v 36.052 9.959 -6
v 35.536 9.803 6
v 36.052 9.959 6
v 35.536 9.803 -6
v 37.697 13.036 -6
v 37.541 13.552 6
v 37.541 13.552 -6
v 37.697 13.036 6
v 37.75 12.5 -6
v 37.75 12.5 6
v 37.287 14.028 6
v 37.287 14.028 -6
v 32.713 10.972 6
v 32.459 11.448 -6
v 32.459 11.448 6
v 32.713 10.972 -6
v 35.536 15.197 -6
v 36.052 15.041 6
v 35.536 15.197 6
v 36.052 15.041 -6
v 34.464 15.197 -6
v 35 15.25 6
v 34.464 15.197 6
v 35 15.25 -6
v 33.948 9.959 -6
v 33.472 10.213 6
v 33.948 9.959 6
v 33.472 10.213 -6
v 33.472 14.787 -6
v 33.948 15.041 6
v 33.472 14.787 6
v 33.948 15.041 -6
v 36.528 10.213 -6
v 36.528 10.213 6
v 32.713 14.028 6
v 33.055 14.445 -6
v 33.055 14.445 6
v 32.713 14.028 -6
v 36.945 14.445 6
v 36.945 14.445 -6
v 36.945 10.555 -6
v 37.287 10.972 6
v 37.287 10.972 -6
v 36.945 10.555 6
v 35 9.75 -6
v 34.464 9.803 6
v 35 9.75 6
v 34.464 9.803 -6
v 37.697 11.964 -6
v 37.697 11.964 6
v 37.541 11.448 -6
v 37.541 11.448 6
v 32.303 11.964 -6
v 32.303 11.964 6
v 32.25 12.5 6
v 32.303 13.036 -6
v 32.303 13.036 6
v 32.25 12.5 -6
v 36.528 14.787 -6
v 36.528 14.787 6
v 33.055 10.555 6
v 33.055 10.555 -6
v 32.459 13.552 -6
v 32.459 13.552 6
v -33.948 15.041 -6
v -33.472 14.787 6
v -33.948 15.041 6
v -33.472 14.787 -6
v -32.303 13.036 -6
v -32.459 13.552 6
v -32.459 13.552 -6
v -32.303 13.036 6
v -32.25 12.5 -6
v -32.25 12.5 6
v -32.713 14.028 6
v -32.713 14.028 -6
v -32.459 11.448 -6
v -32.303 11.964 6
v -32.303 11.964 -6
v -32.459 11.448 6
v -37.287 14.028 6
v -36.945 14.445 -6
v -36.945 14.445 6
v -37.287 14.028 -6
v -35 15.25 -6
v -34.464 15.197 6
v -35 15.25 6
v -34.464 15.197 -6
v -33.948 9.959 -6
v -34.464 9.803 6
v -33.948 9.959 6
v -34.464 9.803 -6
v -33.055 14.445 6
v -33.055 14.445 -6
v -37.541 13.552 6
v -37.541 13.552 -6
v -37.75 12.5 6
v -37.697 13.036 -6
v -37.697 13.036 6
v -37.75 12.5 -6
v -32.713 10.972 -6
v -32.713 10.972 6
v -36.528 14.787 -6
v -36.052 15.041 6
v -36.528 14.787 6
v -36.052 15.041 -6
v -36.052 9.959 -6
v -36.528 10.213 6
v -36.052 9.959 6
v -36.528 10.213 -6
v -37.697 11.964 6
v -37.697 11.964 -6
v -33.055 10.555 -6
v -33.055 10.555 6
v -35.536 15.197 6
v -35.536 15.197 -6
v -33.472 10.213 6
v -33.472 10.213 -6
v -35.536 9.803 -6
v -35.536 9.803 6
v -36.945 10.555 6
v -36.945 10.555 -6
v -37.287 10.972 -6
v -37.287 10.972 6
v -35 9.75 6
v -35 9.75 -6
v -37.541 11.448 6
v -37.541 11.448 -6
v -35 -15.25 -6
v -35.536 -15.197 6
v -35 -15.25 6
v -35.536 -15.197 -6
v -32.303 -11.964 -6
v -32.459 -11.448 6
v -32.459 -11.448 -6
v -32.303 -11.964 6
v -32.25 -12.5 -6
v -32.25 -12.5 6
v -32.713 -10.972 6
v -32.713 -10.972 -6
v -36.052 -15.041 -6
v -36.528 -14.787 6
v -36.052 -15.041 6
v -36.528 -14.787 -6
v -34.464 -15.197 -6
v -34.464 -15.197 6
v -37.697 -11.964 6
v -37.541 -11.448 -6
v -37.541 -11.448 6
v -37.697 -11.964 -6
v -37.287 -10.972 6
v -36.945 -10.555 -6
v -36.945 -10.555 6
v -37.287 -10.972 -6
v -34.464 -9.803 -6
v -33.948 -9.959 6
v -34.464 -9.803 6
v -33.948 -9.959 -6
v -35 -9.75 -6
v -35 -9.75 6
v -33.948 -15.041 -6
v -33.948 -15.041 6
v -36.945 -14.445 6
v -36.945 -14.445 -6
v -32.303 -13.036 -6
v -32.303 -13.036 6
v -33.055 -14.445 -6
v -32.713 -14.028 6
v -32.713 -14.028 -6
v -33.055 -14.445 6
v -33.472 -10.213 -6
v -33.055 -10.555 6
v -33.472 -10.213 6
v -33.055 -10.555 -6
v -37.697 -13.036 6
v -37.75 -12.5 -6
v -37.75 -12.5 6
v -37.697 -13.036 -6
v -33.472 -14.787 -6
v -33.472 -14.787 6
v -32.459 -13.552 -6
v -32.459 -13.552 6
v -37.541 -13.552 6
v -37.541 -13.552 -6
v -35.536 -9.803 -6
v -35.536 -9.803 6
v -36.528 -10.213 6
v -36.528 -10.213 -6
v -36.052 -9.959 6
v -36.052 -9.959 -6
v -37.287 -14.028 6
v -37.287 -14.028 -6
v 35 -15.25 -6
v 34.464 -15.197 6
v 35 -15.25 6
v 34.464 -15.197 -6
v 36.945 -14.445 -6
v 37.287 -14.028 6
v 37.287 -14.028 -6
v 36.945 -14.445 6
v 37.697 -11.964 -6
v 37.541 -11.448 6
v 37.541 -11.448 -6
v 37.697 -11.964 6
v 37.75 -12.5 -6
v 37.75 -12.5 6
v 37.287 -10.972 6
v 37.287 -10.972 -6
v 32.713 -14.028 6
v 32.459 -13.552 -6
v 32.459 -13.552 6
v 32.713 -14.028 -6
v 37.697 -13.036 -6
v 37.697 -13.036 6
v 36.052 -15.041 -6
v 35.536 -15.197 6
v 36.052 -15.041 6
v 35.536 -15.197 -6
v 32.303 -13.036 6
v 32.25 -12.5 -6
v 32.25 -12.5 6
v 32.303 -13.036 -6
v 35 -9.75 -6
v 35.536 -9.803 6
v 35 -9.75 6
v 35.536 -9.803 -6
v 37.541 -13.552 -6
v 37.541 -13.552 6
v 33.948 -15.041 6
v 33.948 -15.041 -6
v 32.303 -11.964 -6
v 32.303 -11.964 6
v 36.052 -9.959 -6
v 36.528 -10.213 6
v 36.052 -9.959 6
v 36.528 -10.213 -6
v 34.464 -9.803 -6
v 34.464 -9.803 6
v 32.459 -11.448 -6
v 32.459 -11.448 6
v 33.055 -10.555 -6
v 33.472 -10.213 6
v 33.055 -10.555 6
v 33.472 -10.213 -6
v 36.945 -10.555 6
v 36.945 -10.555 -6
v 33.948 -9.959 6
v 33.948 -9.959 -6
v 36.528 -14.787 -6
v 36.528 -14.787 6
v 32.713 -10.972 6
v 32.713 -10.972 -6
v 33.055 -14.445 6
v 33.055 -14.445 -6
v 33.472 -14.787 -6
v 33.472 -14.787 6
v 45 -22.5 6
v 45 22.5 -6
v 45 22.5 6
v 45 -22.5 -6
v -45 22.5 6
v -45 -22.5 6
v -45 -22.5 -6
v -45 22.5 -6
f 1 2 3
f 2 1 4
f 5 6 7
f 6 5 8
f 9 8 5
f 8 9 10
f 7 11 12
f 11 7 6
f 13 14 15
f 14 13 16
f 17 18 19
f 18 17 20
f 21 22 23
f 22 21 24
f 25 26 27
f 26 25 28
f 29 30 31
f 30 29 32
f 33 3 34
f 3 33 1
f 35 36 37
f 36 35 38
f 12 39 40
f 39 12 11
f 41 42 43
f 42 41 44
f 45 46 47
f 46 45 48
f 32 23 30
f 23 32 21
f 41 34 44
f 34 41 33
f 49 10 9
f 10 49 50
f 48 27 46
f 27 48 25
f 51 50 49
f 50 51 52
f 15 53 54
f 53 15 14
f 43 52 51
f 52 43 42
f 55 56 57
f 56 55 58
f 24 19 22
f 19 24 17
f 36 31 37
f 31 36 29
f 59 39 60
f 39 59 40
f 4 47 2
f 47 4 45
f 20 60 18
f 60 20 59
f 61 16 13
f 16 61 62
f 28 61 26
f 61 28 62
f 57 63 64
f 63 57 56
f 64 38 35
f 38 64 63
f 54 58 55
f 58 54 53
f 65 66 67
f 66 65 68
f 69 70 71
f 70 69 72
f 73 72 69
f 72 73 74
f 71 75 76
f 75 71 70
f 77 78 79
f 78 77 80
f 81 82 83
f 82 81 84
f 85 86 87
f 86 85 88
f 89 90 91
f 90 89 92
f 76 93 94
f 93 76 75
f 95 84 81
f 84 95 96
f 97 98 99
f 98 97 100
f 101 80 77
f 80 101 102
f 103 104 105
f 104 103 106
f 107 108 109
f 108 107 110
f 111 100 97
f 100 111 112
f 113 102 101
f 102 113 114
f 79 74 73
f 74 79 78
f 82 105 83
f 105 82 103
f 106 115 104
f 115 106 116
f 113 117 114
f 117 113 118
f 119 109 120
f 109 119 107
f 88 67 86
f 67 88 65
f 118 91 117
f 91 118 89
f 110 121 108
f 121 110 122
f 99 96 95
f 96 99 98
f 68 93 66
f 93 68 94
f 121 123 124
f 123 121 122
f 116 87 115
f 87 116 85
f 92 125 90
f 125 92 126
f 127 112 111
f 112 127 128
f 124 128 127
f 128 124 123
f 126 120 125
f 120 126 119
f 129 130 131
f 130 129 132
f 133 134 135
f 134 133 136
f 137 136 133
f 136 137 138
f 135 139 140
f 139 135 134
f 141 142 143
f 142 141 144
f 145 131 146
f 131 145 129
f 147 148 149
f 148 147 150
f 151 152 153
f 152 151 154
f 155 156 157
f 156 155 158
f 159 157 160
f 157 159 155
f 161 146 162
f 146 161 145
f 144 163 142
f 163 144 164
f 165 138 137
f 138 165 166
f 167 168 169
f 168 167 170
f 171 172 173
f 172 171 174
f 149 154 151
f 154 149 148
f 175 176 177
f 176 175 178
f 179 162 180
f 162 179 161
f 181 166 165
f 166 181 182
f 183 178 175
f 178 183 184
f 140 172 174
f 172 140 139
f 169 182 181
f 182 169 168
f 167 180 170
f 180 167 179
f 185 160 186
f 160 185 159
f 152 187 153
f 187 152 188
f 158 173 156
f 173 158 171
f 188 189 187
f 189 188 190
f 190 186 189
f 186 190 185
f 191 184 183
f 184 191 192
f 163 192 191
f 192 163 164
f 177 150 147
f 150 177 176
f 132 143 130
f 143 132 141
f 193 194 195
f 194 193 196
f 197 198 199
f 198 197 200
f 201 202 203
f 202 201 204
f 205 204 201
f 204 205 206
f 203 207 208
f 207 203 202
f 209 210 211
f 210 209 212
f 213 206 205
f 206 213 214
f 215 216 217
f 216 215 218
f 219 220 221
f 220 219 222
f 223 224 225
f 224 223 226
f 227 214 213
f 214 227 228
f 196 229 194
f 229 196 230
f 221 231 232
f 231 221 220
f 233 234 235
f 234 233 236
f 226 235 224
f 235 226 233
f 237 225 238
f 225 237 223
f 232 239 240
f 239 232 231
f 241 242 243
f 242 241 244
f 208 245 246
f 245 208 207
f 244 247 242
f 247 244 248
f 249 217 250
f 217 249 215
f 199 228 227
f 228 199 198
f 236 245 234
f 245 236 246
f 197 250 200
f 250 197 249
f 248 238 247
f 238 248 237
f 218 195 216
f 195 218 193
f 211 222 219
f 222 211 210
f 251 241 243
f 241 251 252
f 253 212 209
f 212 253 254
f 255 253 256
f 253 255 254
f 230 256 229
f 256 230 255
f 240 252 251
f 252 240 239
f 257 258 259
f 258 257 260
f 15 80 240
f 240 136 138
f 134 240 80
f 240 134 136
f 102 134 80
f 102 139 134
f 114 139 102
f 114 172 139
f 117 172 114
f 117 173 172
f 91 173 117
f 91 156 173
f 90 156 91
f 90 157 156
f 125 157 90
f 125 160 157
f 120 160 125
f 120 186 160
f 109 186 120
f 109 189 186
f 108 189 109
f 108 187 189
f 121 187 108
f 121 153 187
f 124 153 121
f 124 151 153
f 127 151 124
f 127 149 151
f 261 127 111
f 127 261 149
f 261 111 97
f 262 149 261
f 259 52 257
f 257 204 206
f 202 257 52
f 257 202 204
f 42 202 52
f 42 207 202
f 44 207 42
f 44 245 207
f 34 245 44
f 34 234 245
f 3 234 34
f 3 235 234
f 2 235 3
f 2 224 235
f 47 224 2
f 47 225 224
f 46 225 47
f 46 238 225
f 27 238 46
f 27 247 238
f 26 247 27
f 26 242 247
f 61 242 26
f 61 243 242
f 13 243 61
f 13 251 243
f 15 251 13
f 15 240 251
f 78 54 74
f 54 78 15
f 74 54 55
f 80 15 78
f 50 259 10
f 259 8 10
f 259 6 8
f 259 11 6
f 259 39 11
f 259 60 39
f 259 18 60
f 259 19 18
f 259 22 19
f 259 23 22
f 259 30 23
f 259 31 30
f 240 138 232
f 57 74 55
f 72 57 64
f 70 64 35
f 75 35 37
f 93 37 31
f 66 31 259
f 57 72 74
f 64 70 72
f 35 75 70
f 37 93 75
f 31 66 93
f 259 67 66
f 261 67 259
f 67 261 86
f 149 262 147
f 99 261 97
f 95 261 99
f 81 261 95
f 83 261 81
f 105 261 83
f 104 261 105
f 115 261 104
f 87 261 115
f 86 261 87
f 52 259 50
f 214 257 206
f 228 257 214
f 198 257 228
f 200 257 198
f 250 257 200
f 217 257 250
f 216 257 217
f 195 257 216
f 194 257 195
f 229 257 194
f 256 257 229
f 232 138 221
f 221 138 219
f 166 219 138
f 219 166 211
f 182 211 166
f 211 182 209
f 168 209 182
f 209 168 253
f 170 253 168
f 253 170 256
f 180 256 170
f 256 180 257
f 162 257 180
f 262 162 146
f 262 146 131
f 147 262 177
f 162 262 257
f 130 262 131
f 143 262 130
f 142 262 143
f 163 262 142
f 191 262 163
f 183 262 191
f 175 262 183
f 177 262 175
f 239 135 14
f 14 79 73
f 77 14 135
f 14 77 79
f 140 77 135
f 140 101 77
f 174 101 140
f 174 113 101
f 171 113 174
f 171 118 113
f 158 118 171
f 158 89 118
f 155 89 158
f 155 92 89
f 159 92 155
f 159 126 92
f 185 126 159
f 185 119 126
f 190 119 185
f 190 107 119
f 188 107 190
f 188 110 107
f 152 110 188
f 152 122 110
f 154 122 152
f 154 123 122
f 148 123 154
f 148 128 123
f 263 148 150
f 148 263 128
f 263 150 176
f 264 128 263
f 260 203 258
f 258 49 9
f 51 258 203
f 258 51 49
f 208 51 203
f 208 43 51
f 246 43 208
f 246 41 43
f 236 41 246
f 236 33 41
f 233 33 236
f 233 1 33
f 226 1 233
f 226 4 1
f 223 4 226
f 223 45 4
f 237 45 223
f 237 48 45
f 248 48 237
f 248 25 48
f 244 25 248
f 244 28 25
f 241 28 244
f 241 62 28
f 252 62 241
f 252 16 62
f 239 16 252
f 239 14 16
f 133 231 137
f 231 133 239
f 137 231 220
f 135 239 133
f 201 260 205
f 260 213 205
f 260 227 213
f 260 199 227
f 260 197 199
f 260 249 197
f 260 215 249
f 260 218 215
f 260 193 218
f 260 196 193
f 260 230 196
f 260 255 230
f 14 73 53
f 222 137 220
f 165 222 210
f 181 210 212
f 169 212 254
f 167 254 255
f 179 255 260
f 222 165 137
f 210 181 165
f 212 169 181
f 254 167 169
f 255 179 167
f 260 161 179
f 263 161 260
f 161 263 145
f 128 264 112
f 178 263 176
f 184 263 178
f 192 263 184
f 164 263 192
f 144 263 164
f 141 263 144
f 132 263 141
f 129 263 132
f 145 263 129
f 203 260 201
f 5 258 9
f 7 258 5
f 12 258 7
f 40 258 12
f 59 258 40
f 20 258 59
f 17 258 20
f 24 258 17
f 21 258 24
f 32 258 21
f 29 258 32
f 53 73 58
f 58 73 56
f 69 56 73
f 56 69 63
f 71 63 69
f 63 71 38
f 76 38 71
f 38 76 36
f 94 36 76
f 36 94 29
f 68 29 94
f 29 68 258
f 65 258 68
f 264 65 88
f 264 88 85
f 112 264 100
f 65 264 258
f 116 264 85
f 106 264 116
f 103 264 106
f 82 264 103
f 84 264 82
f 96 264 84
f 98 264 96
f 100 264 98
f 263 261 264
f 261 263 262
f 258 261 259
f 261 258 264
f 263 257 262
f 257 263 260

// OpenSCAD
$fn = 32;

// ----------------------------------------------------------------------
// Corner plate 90 x 45 x 12
// 4 holes, centres taken from the edge offset
// ----------------------------------------------------------------------

// --- parameters (mm) ---
plate = [90, 45, 12];  // overall size (x, y, z)
holes = 4;             // number of holes the drawing asks for
hole_d = 5.5;          // hole diameter
edge = 10;             // hole centre offset from the plate edge

// --- derived feature positions (mm) ---
corner_x = plate[0] / 2 - edge;  // = 35   corner hole X
corner_y = plate[1] / 2 - edge;  // = 12.5   corner hole Y
feature_centers = [
  [corner_x, corner_y],
  [-corner_x, corner_y],
  [-corner_x, -corner_y],
  [corner_x, -corner_y]
];   // hole centres the loop below drills

// plate outline, every hole drilled through with the same cutters
difference() {
  cube(plate, center = true);
  for (centre = feature_centers)
    translate([centre[0], centre[1], 0])
      cylinder(d = hole_d, h = plate[2] + 2, center = true);
}
